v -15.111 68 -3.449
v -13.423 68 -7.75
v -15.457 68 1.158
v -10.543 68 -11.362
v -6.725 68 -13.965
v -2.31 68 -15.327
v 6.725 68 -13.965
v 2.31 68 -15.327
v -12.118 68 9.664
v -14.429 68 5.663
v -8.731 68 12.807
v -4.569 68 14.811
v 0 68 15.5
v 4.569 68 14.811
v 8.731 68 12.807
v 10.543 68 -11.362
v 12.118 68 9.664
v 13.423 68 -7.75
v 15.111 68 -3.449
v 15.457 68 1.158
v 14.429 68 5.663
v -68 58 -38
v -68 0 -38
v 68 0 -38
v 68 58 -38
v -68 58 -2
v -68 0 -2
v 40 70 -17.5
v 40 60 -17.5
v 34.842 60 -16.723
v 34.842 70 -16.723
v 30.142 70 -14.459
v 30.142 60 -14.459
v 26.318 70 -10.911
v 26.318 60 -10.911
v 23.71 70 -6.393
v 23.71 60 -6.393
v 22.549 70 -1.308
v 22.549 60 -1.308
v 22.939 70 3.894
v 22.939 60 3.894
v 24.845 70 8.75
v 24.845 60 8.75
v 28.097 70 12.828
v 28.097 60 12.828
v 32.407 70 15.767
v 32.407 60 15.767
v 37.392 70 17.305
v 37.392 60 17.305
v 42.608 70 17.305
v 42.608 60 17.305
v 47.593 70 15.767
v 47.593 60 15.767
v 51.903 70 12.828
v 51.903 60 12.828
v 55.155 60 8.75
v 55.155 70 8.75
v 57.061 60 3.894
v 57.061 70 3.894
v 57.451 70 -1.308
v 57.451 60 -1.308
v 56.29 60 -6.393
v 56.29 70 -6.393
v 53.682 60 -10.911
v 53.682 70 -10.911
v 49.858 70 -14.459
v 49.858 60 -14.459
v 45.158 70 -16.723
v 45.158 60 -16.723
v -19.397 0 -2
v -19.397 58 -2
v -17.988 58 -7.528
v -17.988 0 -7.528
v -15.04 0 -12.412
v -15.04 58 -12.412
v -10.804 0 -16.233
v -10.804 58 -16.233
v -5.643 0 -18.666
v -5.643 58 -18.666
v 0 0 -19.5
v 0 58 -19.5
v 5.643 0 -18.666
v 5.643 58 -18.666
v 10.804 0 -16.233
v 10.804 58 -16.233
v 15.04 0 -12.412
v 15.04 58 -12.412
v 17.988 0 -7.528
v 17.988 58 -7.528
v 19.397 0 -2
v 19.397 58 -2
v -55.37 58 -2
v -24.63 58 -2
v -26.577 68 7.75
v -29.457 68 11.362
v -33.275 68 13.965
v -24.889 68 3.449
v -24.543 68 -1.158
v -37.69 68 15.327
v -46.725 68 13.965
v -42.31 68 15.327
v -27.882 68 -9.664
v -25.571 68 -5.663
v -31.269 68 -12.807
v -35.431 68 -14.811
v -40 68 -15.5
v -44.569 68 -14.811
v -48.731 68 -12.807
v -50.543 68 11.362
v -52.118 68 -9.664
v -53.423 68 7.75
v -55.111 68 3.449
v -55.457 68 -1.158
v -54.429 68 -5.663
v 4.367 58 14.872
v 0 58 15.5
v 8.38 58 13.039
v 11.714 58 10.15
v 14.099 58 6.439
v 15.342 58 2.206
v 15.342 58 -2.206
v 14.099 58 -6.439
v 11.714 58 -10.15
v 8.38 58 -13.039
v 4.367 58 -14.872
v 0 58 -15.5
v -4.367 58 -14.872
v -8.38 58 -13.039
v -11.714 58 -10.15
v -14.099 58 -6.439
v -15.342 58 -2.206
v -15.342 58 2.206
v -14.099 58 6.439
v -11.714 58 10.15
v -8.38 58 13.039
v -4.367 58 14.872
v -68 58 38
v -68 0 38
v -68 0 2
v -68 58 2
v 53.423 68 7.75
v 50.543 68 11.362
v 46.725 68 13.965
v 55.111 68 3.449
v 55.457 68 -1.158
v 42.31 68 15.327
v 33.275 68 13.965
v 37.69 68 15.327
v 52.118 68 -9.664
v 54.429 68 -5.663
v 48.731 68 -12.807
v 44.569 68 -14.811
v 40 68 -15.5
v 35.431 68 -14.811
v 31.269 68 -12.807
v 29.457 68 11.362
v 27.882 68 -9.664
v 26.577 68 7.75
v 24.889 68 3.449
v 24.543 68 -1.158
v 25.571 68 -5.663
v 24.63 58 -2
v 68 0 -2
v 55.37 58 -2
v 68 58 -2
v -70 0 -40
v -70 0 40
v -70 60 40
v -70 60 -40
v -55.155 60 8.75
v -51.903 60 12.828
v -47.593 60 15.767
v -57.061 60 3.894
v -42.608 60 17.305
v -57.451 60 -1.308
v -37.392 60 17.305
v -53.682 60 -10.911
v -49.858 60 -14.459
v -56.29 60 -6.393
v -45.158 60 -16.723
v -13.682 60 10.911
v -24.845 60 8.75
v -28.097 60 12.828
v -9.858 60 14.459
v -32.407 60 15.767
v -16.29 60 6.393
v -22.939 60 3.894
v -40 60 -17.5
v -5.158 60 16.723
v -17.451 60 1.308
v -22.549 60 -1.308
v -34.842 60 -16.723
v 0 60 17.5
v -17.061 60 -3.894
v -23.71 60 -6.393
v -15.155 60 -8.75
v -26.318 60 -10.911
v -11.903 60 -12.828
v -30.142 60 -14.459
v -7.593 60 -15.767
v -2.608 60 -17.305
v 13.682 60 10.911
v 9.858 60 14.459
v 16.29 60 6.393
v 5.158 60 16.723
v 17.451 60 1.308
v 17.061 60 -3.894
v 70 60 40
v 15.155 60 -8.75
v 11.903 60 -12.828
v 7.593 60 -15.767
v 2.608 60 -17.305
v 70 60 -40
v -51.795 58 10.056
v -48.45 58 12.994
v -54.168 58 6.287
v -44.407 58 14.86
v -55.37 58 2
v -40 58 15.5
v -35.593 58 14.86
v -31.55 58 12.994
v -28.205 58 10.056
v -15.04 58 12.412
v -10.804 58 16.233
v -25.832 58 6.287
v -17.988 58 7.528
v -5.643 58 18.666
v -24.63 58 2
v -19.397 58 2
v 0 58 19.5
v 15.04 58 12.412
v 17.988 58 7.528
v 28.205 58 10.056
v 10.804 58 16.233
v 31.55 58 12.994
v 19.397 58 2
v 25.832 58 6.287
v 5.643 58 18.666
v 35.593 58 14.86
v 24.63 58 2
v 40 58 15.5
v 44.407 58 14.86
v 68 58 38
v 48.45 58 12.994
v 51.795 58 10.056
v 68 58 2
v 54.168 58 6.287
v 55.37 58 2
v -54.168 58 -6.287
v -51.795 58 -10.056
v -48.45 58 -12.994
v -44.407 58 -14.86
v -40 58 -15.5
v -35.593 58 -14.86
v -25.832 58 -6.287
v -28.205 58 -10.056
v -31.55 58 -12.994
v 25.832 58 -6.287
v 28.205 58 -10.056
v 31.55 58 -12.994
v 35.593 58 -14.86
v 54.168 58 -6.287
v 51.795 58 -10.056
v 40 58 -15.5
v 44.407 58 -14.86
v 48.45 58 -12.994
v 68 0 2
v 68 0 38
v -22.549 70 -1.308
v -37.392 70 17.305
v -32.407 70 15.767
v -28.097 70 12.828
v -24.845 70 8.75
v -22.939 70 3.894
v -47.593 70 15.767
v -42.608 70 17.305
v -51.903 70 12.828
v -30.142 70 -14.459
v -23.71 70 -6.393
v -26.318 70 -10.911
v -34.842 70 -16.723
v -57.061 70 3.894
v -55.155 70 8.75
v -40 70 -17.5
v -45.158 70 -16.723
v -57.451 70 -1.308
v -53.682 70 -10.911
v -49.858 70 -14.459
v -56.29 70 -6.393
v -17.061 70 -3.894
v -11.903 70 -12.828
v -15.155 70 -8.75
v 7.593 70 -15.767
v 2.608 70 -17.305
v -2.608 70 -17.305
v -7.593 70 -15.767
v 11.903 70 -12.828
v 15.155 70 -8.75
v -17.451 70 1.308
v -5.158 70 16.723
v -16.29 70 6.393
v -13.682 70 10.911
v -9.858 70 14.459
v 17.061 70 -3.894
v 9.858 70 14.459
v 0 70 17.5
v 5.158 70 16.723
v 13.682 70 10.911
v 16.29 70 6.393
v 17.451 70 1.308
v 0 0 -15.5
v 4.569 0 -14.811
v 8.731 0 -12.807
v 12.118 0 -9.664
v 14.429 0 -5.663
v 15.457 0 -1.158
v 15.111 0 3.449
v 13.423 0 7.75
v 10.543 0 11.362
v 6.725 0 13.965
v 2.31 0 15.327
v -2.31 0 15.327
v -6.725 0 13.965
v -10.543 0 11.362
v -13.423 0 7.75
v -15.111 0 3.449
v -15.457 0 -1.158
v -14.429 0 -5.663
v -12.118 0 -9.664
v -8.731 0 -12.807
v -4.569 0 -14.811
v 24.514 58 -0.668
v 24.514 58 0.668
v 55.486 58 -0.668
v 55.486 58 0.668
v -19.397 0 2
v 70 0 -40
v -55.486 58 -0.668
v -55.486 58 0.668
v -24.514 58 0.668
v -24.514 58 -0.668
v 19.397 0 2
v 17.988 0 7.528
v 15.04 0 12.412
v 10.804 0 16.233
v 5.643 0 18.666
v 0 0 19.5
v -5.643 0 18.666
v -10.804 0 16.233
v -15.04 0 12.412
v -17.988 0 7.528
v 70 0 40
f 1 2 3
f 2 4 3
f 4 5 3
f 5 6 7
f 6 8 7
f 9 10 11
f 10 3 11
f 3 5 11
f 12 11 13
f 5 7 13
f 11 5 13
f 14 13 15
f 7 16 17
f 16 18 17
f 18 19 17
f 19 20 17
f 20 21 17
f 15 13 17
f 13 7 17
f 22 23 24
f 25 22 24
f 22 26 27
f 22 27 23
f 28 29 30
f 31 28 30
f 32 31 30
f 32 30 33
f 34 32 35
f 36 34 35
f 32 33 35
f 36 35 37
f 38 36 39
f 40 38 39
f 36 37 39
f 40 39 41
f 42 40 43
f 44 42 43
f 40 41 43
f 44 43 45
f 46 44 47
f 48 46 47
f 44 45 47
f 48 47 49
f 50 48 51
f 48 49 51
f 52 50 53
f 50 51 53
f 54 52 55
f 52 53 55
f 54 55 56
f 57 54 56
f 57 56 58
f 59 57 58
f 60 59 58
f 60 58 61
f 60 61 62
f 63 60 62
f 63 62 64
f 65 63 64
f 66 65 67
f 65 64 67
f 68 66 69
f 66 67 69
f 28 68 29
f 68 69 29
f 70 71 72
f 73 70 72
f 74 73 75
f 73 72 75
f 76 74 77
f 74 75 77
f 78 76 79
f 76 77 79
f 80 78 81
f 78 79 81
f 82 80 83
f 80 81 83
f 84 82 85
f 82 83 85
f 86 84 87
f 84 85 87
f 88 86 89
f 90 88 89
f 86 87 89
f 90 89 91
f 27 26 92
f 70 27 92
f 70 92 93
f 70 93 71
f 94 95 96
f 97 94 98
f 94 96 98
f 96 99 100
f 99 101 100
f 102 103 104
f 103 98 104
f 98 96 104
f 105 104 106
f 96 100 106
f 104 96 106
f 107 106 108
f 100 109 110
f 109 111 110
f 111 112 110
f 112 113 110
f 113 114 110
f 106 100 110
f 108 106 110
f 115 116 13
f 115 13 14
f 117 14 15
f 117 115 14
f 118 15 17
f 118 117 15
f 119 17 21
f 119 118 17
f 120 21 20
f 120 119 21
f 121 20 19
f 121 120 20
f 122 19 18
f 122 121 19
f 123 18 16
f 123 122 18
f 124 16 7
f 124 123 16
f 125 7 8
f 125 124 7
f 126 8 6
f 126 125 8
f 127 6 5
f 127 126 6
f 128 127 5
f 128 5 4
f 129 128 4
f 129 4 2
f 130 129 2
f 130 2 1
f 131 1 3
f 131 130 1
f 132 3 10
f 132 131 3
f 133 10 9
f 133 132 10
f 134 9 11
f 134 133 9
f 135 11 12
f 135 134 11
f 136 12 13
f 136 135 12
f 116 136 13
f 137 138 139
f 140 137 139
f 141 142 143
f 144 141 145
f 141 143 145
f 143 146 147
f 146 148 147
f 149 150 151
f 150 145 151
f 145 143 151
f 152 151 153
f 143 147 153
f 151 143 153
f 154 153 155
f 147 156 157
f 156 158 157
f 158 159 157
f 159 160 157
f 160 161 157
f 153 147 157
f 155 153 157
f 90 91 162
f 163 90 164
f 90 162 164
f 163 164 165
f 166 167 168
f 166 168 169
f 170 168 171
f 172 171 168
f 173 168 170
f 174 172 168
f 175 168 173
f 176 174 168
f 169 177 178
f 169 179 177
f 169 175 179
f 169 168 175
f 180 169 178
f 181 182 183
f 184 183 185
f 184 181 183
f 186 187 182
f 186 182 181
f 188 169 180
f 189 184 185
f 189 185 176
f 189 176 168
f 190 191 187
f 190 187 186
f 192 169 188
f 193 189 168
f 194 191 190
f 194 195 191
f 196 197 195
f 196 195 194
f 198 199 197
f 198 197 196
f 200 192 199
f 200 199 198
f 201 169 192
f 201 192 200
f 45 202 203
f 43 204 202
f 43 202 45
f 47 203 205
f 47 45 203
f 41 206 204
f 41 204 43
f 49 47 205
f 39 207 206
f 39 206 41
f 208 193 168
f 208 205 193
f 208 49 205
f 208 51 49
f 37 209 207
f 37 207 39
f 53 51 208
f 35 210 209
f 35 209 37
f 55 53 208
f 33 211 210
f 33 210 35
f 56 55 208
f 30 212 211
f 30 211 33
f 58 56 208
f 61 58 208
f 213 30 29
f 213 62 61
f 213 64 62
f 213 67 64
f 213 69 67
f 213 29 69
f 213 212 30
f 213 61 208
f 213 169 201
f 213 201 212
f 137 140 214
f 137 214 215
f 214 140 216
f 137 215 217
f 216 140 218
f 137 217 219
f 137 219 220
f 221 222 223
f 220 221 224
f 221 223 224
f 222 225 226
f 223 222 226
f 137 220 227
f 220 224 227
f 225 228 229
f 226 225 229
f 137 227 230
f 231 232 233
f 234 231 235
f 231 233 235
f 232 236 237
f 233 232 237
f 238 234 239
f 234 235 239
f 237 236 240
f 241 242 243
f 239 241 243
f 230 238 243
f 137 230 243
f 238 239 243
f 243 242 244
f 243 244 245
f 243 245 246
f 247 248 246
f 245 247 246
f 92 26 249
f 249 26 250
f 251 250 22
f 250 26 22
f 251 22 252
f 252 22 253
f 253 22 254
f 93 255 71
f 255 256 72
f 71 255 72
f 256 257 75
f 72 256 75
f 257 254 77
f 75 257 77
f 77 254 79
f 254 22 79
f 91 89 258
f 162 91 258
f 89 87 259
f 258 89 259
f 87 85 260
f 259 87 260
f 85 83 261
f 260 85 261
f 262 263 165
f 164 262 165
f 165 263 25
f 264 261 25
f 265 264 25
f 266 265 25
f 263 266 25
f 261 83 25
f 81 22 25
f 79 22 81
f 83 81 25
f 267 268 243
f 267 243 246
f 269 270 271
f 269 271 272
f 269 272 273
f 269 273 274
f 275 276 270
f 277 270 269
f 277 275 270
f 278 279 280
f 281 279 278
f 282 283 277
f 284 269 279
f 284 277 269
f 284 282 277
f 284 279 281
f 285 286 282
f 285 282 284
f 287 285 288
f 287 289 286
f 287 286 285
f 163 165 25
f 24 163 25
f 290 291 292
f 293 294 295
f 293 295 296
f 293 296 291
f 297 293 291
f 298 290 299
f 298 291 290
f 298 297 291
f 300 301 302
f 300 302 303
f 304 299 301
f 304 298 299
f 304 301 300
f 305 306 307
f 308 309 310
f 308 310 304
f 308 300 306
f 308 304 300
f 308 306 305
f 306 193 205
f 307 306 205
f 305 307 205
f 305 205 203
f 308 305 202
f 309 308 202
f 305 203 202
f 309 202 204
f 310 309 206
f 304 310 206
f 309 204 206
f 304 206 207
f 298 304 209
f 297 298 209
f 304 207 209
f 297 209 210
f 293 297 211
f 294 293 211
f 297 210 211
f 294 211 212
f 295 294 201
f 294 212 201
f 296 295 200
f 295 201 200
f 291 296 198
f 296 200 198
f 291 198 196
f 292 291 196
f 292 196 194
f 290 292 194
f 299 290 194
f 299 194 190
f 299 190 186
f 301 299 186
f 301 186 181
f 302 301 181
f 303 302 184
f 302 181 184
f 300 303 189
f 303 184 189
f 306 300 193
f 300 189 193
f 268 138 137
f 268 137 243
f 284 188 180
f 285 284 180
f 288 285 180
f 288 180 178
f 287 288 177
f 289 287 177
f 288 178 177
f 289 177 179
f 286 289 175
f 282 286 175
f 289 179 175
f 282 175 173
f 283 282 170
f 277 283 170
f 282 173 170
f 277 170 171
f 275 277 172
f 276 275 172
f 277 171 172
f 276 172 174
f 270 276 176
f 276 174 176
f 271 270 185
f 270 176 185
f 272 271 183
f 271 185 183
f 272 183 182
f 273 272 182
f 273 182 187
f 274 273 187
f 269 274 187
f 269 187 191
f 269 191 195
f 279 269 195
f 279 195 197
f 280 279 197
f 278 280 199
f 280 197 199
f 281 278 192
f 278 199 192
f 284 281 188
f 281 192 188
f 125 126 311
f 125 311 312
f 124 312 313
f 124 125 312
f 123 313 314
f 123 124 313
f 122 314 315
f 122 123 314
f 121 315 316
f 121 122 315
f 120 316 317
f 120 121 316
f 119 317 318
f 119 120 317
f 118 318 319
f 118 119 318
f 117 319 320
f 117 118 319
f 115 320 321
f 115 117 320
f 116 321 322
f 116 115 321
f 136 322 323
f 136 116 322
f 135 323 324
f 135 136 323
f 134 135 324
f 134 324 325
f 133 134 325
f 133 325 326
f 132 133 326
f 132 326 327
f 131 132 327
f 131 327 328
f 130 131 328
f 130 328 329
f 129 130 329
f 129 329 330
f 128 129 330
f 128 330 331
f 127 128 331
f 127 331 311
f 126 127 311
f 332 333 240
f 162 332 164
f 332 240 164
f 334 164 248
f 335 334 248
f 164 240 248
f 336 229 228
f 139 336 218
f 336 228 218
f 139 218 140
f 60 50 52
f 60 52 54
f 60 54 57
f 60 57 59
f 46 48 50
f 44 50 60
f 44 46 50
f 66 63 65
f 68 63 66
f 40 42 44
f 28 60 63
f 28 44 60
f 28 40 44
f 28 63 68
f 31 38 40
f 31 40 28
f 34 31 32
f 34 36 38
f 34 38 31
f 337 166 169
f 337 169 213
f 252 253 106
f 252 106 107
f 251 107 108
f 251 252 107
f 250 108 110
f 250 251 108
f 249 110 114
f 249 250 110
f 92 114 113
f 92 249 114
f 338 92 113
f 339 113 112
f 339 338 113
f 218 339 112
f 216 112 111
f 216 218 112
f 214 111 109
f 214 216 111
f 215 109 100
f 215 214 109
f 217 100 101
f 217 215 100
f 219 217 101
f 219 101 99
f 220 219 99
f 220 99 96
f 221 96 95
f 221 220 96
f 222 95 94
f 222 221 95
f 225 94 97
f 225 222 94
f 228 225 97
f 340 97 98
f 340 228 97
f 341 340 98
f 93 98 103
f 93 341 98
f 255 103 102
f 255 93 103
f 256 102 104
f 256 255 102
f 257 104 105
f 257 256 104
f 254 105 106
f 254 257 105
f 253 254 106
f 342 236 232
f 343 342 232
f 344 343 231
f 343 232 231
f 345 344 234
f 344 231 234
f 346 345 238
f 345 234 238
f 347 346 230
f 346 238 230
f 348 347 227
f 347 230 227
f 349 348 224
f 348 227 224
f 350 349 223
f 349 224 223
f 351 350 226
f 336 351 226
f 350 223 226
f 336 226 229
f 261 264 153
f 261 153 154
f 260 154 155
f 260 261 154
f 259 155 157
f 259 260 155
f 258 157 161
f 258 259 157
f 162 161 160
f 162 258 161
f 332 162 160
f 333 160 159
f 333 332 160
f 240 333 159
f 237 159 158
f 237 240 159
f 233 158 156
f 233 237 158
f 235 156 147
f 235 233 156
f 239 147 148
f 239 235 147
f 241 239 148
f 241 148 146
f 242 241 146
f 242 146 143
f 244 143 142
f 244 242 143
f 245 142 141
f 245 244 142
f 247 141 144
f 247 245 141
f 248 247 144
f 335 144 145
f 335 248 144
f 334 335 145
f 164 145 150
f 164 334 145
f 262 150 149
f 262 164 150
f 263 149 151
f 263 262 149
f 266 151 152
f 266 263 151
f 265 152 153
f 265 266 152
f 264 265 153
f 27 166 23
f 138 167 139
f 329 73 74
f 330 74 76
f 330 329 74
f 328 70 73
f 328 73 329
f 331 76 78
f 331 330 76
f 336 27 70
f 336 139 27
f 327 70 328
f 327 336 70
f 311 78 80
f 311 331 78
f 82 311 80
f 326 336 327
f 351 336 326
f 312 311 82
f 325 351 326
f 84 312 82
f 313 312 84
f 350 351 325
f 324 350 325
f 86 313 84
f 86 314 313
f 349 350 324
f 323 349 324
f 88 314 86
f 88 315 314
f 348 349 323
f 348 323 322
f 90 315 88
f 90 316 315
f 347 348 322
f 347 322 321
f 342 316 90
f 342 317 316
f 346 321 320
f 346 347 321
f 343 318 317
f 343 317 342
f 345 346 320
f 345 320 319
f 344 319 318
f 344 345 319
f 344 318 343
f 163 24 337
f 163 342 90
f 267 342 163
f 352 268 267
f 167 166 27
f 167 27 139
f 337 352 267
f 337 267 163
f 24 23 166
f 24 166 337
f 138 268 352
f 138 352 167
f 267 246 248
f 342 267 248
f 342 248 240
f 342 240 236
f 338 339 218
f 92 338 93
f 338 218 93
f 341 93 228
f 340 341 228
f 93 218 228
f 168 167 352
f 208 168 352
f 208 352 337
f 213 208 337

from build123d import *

# Parameters (mm, degrees)
CROQUIS1_W              = 140
CROQUIS1_H              = 80
SALIENTE_EXTRUIR1_DEPTH = 60
CROQUIS2_R              = 17.5
SALIENTE_EXTRUIR2_DEPTH = 10
VACIADO1_T              = -2
CROQUIS3_R              = 15.5
SALIENTE_EXTRUIR3_DEPTH = 58


with BuildPart() as part:
    # Croquis1 → Saliente-Extruir1 (new body)
    with BuildSketch(Plane(origin=(0, 0, 0), x_dir=(1, 0, 0), z_dir=(0, 1, 0))):
        Rectangle(CROQUIS1_W, CROQUIS1_H)
    extrude(amount=SALIENTE_EXTRUIR1_DEPTH)

    # Croquis2 → Saliente-Extruir2 (add)
    with BuildSketch(Plane(origin=(0, 60, 0), x_dir=(1, 0, 0), z_dir=(0, 1, 0))):
        with Locations(Location((0, 0, 0), (0, 0, 270))):  # turned: the seam where the file's is
            Circle(CROQUIS2_R)
        with Locations(Location((-40, 0, 0), (0, 0, 90))):  # turned: the seam where the file's is
            Circle(CROQUIS2_R)
        with Locations(Location((40, 0, 0), (0, 0, 90))):  # turned: the seam where the file's is
            Circle(CROQUIS2_R)
    extrude(amount=SALIENTE_EXTRUIR2_DEPTH)

    # Vaciado1
    vaciado1_openings = [part.faces().sort_by_distance(p)[0] for p in [
        (0, 0, 0),
    ]]
    offset(amount=VACIADO1_T, openings=vaciado1_openings, kind=Kind.INTERSECTION)

    # Croquis3 → Saliente-Extruir3 (add)
    with BuildSketch(Plane.XZ.offset(-58)):
        with BuildLine():
            Line((-68, -2), (-19.397164741, -2))
            ThreePointArc((-19.397164741, -2), (0, -19.5), (19.397164741, -2))
            Line((19.397164741, -2), (68, -2))
            Line((68, -2), (68, 2))
            Line((68, 2), (19.397164741, 2))
            ThreePointArc((19.397164741, 2), (0, 19.5), (-19.397164741, 2))
            Line((-19.397164741, 2), (-68, 2))
            Line((-68, 2), (-68, -2))
        make_face()
        with Locations(Location((0, 0, 0), (0, 0, 270))):  # turned: the seam where the file's is
            Circle(CROQUIS3_R, mode=Mode.SUBTRACT)
    extrude(amount=SALIENTE_EXTRUIR3_DEPTH)


solid = part.part
